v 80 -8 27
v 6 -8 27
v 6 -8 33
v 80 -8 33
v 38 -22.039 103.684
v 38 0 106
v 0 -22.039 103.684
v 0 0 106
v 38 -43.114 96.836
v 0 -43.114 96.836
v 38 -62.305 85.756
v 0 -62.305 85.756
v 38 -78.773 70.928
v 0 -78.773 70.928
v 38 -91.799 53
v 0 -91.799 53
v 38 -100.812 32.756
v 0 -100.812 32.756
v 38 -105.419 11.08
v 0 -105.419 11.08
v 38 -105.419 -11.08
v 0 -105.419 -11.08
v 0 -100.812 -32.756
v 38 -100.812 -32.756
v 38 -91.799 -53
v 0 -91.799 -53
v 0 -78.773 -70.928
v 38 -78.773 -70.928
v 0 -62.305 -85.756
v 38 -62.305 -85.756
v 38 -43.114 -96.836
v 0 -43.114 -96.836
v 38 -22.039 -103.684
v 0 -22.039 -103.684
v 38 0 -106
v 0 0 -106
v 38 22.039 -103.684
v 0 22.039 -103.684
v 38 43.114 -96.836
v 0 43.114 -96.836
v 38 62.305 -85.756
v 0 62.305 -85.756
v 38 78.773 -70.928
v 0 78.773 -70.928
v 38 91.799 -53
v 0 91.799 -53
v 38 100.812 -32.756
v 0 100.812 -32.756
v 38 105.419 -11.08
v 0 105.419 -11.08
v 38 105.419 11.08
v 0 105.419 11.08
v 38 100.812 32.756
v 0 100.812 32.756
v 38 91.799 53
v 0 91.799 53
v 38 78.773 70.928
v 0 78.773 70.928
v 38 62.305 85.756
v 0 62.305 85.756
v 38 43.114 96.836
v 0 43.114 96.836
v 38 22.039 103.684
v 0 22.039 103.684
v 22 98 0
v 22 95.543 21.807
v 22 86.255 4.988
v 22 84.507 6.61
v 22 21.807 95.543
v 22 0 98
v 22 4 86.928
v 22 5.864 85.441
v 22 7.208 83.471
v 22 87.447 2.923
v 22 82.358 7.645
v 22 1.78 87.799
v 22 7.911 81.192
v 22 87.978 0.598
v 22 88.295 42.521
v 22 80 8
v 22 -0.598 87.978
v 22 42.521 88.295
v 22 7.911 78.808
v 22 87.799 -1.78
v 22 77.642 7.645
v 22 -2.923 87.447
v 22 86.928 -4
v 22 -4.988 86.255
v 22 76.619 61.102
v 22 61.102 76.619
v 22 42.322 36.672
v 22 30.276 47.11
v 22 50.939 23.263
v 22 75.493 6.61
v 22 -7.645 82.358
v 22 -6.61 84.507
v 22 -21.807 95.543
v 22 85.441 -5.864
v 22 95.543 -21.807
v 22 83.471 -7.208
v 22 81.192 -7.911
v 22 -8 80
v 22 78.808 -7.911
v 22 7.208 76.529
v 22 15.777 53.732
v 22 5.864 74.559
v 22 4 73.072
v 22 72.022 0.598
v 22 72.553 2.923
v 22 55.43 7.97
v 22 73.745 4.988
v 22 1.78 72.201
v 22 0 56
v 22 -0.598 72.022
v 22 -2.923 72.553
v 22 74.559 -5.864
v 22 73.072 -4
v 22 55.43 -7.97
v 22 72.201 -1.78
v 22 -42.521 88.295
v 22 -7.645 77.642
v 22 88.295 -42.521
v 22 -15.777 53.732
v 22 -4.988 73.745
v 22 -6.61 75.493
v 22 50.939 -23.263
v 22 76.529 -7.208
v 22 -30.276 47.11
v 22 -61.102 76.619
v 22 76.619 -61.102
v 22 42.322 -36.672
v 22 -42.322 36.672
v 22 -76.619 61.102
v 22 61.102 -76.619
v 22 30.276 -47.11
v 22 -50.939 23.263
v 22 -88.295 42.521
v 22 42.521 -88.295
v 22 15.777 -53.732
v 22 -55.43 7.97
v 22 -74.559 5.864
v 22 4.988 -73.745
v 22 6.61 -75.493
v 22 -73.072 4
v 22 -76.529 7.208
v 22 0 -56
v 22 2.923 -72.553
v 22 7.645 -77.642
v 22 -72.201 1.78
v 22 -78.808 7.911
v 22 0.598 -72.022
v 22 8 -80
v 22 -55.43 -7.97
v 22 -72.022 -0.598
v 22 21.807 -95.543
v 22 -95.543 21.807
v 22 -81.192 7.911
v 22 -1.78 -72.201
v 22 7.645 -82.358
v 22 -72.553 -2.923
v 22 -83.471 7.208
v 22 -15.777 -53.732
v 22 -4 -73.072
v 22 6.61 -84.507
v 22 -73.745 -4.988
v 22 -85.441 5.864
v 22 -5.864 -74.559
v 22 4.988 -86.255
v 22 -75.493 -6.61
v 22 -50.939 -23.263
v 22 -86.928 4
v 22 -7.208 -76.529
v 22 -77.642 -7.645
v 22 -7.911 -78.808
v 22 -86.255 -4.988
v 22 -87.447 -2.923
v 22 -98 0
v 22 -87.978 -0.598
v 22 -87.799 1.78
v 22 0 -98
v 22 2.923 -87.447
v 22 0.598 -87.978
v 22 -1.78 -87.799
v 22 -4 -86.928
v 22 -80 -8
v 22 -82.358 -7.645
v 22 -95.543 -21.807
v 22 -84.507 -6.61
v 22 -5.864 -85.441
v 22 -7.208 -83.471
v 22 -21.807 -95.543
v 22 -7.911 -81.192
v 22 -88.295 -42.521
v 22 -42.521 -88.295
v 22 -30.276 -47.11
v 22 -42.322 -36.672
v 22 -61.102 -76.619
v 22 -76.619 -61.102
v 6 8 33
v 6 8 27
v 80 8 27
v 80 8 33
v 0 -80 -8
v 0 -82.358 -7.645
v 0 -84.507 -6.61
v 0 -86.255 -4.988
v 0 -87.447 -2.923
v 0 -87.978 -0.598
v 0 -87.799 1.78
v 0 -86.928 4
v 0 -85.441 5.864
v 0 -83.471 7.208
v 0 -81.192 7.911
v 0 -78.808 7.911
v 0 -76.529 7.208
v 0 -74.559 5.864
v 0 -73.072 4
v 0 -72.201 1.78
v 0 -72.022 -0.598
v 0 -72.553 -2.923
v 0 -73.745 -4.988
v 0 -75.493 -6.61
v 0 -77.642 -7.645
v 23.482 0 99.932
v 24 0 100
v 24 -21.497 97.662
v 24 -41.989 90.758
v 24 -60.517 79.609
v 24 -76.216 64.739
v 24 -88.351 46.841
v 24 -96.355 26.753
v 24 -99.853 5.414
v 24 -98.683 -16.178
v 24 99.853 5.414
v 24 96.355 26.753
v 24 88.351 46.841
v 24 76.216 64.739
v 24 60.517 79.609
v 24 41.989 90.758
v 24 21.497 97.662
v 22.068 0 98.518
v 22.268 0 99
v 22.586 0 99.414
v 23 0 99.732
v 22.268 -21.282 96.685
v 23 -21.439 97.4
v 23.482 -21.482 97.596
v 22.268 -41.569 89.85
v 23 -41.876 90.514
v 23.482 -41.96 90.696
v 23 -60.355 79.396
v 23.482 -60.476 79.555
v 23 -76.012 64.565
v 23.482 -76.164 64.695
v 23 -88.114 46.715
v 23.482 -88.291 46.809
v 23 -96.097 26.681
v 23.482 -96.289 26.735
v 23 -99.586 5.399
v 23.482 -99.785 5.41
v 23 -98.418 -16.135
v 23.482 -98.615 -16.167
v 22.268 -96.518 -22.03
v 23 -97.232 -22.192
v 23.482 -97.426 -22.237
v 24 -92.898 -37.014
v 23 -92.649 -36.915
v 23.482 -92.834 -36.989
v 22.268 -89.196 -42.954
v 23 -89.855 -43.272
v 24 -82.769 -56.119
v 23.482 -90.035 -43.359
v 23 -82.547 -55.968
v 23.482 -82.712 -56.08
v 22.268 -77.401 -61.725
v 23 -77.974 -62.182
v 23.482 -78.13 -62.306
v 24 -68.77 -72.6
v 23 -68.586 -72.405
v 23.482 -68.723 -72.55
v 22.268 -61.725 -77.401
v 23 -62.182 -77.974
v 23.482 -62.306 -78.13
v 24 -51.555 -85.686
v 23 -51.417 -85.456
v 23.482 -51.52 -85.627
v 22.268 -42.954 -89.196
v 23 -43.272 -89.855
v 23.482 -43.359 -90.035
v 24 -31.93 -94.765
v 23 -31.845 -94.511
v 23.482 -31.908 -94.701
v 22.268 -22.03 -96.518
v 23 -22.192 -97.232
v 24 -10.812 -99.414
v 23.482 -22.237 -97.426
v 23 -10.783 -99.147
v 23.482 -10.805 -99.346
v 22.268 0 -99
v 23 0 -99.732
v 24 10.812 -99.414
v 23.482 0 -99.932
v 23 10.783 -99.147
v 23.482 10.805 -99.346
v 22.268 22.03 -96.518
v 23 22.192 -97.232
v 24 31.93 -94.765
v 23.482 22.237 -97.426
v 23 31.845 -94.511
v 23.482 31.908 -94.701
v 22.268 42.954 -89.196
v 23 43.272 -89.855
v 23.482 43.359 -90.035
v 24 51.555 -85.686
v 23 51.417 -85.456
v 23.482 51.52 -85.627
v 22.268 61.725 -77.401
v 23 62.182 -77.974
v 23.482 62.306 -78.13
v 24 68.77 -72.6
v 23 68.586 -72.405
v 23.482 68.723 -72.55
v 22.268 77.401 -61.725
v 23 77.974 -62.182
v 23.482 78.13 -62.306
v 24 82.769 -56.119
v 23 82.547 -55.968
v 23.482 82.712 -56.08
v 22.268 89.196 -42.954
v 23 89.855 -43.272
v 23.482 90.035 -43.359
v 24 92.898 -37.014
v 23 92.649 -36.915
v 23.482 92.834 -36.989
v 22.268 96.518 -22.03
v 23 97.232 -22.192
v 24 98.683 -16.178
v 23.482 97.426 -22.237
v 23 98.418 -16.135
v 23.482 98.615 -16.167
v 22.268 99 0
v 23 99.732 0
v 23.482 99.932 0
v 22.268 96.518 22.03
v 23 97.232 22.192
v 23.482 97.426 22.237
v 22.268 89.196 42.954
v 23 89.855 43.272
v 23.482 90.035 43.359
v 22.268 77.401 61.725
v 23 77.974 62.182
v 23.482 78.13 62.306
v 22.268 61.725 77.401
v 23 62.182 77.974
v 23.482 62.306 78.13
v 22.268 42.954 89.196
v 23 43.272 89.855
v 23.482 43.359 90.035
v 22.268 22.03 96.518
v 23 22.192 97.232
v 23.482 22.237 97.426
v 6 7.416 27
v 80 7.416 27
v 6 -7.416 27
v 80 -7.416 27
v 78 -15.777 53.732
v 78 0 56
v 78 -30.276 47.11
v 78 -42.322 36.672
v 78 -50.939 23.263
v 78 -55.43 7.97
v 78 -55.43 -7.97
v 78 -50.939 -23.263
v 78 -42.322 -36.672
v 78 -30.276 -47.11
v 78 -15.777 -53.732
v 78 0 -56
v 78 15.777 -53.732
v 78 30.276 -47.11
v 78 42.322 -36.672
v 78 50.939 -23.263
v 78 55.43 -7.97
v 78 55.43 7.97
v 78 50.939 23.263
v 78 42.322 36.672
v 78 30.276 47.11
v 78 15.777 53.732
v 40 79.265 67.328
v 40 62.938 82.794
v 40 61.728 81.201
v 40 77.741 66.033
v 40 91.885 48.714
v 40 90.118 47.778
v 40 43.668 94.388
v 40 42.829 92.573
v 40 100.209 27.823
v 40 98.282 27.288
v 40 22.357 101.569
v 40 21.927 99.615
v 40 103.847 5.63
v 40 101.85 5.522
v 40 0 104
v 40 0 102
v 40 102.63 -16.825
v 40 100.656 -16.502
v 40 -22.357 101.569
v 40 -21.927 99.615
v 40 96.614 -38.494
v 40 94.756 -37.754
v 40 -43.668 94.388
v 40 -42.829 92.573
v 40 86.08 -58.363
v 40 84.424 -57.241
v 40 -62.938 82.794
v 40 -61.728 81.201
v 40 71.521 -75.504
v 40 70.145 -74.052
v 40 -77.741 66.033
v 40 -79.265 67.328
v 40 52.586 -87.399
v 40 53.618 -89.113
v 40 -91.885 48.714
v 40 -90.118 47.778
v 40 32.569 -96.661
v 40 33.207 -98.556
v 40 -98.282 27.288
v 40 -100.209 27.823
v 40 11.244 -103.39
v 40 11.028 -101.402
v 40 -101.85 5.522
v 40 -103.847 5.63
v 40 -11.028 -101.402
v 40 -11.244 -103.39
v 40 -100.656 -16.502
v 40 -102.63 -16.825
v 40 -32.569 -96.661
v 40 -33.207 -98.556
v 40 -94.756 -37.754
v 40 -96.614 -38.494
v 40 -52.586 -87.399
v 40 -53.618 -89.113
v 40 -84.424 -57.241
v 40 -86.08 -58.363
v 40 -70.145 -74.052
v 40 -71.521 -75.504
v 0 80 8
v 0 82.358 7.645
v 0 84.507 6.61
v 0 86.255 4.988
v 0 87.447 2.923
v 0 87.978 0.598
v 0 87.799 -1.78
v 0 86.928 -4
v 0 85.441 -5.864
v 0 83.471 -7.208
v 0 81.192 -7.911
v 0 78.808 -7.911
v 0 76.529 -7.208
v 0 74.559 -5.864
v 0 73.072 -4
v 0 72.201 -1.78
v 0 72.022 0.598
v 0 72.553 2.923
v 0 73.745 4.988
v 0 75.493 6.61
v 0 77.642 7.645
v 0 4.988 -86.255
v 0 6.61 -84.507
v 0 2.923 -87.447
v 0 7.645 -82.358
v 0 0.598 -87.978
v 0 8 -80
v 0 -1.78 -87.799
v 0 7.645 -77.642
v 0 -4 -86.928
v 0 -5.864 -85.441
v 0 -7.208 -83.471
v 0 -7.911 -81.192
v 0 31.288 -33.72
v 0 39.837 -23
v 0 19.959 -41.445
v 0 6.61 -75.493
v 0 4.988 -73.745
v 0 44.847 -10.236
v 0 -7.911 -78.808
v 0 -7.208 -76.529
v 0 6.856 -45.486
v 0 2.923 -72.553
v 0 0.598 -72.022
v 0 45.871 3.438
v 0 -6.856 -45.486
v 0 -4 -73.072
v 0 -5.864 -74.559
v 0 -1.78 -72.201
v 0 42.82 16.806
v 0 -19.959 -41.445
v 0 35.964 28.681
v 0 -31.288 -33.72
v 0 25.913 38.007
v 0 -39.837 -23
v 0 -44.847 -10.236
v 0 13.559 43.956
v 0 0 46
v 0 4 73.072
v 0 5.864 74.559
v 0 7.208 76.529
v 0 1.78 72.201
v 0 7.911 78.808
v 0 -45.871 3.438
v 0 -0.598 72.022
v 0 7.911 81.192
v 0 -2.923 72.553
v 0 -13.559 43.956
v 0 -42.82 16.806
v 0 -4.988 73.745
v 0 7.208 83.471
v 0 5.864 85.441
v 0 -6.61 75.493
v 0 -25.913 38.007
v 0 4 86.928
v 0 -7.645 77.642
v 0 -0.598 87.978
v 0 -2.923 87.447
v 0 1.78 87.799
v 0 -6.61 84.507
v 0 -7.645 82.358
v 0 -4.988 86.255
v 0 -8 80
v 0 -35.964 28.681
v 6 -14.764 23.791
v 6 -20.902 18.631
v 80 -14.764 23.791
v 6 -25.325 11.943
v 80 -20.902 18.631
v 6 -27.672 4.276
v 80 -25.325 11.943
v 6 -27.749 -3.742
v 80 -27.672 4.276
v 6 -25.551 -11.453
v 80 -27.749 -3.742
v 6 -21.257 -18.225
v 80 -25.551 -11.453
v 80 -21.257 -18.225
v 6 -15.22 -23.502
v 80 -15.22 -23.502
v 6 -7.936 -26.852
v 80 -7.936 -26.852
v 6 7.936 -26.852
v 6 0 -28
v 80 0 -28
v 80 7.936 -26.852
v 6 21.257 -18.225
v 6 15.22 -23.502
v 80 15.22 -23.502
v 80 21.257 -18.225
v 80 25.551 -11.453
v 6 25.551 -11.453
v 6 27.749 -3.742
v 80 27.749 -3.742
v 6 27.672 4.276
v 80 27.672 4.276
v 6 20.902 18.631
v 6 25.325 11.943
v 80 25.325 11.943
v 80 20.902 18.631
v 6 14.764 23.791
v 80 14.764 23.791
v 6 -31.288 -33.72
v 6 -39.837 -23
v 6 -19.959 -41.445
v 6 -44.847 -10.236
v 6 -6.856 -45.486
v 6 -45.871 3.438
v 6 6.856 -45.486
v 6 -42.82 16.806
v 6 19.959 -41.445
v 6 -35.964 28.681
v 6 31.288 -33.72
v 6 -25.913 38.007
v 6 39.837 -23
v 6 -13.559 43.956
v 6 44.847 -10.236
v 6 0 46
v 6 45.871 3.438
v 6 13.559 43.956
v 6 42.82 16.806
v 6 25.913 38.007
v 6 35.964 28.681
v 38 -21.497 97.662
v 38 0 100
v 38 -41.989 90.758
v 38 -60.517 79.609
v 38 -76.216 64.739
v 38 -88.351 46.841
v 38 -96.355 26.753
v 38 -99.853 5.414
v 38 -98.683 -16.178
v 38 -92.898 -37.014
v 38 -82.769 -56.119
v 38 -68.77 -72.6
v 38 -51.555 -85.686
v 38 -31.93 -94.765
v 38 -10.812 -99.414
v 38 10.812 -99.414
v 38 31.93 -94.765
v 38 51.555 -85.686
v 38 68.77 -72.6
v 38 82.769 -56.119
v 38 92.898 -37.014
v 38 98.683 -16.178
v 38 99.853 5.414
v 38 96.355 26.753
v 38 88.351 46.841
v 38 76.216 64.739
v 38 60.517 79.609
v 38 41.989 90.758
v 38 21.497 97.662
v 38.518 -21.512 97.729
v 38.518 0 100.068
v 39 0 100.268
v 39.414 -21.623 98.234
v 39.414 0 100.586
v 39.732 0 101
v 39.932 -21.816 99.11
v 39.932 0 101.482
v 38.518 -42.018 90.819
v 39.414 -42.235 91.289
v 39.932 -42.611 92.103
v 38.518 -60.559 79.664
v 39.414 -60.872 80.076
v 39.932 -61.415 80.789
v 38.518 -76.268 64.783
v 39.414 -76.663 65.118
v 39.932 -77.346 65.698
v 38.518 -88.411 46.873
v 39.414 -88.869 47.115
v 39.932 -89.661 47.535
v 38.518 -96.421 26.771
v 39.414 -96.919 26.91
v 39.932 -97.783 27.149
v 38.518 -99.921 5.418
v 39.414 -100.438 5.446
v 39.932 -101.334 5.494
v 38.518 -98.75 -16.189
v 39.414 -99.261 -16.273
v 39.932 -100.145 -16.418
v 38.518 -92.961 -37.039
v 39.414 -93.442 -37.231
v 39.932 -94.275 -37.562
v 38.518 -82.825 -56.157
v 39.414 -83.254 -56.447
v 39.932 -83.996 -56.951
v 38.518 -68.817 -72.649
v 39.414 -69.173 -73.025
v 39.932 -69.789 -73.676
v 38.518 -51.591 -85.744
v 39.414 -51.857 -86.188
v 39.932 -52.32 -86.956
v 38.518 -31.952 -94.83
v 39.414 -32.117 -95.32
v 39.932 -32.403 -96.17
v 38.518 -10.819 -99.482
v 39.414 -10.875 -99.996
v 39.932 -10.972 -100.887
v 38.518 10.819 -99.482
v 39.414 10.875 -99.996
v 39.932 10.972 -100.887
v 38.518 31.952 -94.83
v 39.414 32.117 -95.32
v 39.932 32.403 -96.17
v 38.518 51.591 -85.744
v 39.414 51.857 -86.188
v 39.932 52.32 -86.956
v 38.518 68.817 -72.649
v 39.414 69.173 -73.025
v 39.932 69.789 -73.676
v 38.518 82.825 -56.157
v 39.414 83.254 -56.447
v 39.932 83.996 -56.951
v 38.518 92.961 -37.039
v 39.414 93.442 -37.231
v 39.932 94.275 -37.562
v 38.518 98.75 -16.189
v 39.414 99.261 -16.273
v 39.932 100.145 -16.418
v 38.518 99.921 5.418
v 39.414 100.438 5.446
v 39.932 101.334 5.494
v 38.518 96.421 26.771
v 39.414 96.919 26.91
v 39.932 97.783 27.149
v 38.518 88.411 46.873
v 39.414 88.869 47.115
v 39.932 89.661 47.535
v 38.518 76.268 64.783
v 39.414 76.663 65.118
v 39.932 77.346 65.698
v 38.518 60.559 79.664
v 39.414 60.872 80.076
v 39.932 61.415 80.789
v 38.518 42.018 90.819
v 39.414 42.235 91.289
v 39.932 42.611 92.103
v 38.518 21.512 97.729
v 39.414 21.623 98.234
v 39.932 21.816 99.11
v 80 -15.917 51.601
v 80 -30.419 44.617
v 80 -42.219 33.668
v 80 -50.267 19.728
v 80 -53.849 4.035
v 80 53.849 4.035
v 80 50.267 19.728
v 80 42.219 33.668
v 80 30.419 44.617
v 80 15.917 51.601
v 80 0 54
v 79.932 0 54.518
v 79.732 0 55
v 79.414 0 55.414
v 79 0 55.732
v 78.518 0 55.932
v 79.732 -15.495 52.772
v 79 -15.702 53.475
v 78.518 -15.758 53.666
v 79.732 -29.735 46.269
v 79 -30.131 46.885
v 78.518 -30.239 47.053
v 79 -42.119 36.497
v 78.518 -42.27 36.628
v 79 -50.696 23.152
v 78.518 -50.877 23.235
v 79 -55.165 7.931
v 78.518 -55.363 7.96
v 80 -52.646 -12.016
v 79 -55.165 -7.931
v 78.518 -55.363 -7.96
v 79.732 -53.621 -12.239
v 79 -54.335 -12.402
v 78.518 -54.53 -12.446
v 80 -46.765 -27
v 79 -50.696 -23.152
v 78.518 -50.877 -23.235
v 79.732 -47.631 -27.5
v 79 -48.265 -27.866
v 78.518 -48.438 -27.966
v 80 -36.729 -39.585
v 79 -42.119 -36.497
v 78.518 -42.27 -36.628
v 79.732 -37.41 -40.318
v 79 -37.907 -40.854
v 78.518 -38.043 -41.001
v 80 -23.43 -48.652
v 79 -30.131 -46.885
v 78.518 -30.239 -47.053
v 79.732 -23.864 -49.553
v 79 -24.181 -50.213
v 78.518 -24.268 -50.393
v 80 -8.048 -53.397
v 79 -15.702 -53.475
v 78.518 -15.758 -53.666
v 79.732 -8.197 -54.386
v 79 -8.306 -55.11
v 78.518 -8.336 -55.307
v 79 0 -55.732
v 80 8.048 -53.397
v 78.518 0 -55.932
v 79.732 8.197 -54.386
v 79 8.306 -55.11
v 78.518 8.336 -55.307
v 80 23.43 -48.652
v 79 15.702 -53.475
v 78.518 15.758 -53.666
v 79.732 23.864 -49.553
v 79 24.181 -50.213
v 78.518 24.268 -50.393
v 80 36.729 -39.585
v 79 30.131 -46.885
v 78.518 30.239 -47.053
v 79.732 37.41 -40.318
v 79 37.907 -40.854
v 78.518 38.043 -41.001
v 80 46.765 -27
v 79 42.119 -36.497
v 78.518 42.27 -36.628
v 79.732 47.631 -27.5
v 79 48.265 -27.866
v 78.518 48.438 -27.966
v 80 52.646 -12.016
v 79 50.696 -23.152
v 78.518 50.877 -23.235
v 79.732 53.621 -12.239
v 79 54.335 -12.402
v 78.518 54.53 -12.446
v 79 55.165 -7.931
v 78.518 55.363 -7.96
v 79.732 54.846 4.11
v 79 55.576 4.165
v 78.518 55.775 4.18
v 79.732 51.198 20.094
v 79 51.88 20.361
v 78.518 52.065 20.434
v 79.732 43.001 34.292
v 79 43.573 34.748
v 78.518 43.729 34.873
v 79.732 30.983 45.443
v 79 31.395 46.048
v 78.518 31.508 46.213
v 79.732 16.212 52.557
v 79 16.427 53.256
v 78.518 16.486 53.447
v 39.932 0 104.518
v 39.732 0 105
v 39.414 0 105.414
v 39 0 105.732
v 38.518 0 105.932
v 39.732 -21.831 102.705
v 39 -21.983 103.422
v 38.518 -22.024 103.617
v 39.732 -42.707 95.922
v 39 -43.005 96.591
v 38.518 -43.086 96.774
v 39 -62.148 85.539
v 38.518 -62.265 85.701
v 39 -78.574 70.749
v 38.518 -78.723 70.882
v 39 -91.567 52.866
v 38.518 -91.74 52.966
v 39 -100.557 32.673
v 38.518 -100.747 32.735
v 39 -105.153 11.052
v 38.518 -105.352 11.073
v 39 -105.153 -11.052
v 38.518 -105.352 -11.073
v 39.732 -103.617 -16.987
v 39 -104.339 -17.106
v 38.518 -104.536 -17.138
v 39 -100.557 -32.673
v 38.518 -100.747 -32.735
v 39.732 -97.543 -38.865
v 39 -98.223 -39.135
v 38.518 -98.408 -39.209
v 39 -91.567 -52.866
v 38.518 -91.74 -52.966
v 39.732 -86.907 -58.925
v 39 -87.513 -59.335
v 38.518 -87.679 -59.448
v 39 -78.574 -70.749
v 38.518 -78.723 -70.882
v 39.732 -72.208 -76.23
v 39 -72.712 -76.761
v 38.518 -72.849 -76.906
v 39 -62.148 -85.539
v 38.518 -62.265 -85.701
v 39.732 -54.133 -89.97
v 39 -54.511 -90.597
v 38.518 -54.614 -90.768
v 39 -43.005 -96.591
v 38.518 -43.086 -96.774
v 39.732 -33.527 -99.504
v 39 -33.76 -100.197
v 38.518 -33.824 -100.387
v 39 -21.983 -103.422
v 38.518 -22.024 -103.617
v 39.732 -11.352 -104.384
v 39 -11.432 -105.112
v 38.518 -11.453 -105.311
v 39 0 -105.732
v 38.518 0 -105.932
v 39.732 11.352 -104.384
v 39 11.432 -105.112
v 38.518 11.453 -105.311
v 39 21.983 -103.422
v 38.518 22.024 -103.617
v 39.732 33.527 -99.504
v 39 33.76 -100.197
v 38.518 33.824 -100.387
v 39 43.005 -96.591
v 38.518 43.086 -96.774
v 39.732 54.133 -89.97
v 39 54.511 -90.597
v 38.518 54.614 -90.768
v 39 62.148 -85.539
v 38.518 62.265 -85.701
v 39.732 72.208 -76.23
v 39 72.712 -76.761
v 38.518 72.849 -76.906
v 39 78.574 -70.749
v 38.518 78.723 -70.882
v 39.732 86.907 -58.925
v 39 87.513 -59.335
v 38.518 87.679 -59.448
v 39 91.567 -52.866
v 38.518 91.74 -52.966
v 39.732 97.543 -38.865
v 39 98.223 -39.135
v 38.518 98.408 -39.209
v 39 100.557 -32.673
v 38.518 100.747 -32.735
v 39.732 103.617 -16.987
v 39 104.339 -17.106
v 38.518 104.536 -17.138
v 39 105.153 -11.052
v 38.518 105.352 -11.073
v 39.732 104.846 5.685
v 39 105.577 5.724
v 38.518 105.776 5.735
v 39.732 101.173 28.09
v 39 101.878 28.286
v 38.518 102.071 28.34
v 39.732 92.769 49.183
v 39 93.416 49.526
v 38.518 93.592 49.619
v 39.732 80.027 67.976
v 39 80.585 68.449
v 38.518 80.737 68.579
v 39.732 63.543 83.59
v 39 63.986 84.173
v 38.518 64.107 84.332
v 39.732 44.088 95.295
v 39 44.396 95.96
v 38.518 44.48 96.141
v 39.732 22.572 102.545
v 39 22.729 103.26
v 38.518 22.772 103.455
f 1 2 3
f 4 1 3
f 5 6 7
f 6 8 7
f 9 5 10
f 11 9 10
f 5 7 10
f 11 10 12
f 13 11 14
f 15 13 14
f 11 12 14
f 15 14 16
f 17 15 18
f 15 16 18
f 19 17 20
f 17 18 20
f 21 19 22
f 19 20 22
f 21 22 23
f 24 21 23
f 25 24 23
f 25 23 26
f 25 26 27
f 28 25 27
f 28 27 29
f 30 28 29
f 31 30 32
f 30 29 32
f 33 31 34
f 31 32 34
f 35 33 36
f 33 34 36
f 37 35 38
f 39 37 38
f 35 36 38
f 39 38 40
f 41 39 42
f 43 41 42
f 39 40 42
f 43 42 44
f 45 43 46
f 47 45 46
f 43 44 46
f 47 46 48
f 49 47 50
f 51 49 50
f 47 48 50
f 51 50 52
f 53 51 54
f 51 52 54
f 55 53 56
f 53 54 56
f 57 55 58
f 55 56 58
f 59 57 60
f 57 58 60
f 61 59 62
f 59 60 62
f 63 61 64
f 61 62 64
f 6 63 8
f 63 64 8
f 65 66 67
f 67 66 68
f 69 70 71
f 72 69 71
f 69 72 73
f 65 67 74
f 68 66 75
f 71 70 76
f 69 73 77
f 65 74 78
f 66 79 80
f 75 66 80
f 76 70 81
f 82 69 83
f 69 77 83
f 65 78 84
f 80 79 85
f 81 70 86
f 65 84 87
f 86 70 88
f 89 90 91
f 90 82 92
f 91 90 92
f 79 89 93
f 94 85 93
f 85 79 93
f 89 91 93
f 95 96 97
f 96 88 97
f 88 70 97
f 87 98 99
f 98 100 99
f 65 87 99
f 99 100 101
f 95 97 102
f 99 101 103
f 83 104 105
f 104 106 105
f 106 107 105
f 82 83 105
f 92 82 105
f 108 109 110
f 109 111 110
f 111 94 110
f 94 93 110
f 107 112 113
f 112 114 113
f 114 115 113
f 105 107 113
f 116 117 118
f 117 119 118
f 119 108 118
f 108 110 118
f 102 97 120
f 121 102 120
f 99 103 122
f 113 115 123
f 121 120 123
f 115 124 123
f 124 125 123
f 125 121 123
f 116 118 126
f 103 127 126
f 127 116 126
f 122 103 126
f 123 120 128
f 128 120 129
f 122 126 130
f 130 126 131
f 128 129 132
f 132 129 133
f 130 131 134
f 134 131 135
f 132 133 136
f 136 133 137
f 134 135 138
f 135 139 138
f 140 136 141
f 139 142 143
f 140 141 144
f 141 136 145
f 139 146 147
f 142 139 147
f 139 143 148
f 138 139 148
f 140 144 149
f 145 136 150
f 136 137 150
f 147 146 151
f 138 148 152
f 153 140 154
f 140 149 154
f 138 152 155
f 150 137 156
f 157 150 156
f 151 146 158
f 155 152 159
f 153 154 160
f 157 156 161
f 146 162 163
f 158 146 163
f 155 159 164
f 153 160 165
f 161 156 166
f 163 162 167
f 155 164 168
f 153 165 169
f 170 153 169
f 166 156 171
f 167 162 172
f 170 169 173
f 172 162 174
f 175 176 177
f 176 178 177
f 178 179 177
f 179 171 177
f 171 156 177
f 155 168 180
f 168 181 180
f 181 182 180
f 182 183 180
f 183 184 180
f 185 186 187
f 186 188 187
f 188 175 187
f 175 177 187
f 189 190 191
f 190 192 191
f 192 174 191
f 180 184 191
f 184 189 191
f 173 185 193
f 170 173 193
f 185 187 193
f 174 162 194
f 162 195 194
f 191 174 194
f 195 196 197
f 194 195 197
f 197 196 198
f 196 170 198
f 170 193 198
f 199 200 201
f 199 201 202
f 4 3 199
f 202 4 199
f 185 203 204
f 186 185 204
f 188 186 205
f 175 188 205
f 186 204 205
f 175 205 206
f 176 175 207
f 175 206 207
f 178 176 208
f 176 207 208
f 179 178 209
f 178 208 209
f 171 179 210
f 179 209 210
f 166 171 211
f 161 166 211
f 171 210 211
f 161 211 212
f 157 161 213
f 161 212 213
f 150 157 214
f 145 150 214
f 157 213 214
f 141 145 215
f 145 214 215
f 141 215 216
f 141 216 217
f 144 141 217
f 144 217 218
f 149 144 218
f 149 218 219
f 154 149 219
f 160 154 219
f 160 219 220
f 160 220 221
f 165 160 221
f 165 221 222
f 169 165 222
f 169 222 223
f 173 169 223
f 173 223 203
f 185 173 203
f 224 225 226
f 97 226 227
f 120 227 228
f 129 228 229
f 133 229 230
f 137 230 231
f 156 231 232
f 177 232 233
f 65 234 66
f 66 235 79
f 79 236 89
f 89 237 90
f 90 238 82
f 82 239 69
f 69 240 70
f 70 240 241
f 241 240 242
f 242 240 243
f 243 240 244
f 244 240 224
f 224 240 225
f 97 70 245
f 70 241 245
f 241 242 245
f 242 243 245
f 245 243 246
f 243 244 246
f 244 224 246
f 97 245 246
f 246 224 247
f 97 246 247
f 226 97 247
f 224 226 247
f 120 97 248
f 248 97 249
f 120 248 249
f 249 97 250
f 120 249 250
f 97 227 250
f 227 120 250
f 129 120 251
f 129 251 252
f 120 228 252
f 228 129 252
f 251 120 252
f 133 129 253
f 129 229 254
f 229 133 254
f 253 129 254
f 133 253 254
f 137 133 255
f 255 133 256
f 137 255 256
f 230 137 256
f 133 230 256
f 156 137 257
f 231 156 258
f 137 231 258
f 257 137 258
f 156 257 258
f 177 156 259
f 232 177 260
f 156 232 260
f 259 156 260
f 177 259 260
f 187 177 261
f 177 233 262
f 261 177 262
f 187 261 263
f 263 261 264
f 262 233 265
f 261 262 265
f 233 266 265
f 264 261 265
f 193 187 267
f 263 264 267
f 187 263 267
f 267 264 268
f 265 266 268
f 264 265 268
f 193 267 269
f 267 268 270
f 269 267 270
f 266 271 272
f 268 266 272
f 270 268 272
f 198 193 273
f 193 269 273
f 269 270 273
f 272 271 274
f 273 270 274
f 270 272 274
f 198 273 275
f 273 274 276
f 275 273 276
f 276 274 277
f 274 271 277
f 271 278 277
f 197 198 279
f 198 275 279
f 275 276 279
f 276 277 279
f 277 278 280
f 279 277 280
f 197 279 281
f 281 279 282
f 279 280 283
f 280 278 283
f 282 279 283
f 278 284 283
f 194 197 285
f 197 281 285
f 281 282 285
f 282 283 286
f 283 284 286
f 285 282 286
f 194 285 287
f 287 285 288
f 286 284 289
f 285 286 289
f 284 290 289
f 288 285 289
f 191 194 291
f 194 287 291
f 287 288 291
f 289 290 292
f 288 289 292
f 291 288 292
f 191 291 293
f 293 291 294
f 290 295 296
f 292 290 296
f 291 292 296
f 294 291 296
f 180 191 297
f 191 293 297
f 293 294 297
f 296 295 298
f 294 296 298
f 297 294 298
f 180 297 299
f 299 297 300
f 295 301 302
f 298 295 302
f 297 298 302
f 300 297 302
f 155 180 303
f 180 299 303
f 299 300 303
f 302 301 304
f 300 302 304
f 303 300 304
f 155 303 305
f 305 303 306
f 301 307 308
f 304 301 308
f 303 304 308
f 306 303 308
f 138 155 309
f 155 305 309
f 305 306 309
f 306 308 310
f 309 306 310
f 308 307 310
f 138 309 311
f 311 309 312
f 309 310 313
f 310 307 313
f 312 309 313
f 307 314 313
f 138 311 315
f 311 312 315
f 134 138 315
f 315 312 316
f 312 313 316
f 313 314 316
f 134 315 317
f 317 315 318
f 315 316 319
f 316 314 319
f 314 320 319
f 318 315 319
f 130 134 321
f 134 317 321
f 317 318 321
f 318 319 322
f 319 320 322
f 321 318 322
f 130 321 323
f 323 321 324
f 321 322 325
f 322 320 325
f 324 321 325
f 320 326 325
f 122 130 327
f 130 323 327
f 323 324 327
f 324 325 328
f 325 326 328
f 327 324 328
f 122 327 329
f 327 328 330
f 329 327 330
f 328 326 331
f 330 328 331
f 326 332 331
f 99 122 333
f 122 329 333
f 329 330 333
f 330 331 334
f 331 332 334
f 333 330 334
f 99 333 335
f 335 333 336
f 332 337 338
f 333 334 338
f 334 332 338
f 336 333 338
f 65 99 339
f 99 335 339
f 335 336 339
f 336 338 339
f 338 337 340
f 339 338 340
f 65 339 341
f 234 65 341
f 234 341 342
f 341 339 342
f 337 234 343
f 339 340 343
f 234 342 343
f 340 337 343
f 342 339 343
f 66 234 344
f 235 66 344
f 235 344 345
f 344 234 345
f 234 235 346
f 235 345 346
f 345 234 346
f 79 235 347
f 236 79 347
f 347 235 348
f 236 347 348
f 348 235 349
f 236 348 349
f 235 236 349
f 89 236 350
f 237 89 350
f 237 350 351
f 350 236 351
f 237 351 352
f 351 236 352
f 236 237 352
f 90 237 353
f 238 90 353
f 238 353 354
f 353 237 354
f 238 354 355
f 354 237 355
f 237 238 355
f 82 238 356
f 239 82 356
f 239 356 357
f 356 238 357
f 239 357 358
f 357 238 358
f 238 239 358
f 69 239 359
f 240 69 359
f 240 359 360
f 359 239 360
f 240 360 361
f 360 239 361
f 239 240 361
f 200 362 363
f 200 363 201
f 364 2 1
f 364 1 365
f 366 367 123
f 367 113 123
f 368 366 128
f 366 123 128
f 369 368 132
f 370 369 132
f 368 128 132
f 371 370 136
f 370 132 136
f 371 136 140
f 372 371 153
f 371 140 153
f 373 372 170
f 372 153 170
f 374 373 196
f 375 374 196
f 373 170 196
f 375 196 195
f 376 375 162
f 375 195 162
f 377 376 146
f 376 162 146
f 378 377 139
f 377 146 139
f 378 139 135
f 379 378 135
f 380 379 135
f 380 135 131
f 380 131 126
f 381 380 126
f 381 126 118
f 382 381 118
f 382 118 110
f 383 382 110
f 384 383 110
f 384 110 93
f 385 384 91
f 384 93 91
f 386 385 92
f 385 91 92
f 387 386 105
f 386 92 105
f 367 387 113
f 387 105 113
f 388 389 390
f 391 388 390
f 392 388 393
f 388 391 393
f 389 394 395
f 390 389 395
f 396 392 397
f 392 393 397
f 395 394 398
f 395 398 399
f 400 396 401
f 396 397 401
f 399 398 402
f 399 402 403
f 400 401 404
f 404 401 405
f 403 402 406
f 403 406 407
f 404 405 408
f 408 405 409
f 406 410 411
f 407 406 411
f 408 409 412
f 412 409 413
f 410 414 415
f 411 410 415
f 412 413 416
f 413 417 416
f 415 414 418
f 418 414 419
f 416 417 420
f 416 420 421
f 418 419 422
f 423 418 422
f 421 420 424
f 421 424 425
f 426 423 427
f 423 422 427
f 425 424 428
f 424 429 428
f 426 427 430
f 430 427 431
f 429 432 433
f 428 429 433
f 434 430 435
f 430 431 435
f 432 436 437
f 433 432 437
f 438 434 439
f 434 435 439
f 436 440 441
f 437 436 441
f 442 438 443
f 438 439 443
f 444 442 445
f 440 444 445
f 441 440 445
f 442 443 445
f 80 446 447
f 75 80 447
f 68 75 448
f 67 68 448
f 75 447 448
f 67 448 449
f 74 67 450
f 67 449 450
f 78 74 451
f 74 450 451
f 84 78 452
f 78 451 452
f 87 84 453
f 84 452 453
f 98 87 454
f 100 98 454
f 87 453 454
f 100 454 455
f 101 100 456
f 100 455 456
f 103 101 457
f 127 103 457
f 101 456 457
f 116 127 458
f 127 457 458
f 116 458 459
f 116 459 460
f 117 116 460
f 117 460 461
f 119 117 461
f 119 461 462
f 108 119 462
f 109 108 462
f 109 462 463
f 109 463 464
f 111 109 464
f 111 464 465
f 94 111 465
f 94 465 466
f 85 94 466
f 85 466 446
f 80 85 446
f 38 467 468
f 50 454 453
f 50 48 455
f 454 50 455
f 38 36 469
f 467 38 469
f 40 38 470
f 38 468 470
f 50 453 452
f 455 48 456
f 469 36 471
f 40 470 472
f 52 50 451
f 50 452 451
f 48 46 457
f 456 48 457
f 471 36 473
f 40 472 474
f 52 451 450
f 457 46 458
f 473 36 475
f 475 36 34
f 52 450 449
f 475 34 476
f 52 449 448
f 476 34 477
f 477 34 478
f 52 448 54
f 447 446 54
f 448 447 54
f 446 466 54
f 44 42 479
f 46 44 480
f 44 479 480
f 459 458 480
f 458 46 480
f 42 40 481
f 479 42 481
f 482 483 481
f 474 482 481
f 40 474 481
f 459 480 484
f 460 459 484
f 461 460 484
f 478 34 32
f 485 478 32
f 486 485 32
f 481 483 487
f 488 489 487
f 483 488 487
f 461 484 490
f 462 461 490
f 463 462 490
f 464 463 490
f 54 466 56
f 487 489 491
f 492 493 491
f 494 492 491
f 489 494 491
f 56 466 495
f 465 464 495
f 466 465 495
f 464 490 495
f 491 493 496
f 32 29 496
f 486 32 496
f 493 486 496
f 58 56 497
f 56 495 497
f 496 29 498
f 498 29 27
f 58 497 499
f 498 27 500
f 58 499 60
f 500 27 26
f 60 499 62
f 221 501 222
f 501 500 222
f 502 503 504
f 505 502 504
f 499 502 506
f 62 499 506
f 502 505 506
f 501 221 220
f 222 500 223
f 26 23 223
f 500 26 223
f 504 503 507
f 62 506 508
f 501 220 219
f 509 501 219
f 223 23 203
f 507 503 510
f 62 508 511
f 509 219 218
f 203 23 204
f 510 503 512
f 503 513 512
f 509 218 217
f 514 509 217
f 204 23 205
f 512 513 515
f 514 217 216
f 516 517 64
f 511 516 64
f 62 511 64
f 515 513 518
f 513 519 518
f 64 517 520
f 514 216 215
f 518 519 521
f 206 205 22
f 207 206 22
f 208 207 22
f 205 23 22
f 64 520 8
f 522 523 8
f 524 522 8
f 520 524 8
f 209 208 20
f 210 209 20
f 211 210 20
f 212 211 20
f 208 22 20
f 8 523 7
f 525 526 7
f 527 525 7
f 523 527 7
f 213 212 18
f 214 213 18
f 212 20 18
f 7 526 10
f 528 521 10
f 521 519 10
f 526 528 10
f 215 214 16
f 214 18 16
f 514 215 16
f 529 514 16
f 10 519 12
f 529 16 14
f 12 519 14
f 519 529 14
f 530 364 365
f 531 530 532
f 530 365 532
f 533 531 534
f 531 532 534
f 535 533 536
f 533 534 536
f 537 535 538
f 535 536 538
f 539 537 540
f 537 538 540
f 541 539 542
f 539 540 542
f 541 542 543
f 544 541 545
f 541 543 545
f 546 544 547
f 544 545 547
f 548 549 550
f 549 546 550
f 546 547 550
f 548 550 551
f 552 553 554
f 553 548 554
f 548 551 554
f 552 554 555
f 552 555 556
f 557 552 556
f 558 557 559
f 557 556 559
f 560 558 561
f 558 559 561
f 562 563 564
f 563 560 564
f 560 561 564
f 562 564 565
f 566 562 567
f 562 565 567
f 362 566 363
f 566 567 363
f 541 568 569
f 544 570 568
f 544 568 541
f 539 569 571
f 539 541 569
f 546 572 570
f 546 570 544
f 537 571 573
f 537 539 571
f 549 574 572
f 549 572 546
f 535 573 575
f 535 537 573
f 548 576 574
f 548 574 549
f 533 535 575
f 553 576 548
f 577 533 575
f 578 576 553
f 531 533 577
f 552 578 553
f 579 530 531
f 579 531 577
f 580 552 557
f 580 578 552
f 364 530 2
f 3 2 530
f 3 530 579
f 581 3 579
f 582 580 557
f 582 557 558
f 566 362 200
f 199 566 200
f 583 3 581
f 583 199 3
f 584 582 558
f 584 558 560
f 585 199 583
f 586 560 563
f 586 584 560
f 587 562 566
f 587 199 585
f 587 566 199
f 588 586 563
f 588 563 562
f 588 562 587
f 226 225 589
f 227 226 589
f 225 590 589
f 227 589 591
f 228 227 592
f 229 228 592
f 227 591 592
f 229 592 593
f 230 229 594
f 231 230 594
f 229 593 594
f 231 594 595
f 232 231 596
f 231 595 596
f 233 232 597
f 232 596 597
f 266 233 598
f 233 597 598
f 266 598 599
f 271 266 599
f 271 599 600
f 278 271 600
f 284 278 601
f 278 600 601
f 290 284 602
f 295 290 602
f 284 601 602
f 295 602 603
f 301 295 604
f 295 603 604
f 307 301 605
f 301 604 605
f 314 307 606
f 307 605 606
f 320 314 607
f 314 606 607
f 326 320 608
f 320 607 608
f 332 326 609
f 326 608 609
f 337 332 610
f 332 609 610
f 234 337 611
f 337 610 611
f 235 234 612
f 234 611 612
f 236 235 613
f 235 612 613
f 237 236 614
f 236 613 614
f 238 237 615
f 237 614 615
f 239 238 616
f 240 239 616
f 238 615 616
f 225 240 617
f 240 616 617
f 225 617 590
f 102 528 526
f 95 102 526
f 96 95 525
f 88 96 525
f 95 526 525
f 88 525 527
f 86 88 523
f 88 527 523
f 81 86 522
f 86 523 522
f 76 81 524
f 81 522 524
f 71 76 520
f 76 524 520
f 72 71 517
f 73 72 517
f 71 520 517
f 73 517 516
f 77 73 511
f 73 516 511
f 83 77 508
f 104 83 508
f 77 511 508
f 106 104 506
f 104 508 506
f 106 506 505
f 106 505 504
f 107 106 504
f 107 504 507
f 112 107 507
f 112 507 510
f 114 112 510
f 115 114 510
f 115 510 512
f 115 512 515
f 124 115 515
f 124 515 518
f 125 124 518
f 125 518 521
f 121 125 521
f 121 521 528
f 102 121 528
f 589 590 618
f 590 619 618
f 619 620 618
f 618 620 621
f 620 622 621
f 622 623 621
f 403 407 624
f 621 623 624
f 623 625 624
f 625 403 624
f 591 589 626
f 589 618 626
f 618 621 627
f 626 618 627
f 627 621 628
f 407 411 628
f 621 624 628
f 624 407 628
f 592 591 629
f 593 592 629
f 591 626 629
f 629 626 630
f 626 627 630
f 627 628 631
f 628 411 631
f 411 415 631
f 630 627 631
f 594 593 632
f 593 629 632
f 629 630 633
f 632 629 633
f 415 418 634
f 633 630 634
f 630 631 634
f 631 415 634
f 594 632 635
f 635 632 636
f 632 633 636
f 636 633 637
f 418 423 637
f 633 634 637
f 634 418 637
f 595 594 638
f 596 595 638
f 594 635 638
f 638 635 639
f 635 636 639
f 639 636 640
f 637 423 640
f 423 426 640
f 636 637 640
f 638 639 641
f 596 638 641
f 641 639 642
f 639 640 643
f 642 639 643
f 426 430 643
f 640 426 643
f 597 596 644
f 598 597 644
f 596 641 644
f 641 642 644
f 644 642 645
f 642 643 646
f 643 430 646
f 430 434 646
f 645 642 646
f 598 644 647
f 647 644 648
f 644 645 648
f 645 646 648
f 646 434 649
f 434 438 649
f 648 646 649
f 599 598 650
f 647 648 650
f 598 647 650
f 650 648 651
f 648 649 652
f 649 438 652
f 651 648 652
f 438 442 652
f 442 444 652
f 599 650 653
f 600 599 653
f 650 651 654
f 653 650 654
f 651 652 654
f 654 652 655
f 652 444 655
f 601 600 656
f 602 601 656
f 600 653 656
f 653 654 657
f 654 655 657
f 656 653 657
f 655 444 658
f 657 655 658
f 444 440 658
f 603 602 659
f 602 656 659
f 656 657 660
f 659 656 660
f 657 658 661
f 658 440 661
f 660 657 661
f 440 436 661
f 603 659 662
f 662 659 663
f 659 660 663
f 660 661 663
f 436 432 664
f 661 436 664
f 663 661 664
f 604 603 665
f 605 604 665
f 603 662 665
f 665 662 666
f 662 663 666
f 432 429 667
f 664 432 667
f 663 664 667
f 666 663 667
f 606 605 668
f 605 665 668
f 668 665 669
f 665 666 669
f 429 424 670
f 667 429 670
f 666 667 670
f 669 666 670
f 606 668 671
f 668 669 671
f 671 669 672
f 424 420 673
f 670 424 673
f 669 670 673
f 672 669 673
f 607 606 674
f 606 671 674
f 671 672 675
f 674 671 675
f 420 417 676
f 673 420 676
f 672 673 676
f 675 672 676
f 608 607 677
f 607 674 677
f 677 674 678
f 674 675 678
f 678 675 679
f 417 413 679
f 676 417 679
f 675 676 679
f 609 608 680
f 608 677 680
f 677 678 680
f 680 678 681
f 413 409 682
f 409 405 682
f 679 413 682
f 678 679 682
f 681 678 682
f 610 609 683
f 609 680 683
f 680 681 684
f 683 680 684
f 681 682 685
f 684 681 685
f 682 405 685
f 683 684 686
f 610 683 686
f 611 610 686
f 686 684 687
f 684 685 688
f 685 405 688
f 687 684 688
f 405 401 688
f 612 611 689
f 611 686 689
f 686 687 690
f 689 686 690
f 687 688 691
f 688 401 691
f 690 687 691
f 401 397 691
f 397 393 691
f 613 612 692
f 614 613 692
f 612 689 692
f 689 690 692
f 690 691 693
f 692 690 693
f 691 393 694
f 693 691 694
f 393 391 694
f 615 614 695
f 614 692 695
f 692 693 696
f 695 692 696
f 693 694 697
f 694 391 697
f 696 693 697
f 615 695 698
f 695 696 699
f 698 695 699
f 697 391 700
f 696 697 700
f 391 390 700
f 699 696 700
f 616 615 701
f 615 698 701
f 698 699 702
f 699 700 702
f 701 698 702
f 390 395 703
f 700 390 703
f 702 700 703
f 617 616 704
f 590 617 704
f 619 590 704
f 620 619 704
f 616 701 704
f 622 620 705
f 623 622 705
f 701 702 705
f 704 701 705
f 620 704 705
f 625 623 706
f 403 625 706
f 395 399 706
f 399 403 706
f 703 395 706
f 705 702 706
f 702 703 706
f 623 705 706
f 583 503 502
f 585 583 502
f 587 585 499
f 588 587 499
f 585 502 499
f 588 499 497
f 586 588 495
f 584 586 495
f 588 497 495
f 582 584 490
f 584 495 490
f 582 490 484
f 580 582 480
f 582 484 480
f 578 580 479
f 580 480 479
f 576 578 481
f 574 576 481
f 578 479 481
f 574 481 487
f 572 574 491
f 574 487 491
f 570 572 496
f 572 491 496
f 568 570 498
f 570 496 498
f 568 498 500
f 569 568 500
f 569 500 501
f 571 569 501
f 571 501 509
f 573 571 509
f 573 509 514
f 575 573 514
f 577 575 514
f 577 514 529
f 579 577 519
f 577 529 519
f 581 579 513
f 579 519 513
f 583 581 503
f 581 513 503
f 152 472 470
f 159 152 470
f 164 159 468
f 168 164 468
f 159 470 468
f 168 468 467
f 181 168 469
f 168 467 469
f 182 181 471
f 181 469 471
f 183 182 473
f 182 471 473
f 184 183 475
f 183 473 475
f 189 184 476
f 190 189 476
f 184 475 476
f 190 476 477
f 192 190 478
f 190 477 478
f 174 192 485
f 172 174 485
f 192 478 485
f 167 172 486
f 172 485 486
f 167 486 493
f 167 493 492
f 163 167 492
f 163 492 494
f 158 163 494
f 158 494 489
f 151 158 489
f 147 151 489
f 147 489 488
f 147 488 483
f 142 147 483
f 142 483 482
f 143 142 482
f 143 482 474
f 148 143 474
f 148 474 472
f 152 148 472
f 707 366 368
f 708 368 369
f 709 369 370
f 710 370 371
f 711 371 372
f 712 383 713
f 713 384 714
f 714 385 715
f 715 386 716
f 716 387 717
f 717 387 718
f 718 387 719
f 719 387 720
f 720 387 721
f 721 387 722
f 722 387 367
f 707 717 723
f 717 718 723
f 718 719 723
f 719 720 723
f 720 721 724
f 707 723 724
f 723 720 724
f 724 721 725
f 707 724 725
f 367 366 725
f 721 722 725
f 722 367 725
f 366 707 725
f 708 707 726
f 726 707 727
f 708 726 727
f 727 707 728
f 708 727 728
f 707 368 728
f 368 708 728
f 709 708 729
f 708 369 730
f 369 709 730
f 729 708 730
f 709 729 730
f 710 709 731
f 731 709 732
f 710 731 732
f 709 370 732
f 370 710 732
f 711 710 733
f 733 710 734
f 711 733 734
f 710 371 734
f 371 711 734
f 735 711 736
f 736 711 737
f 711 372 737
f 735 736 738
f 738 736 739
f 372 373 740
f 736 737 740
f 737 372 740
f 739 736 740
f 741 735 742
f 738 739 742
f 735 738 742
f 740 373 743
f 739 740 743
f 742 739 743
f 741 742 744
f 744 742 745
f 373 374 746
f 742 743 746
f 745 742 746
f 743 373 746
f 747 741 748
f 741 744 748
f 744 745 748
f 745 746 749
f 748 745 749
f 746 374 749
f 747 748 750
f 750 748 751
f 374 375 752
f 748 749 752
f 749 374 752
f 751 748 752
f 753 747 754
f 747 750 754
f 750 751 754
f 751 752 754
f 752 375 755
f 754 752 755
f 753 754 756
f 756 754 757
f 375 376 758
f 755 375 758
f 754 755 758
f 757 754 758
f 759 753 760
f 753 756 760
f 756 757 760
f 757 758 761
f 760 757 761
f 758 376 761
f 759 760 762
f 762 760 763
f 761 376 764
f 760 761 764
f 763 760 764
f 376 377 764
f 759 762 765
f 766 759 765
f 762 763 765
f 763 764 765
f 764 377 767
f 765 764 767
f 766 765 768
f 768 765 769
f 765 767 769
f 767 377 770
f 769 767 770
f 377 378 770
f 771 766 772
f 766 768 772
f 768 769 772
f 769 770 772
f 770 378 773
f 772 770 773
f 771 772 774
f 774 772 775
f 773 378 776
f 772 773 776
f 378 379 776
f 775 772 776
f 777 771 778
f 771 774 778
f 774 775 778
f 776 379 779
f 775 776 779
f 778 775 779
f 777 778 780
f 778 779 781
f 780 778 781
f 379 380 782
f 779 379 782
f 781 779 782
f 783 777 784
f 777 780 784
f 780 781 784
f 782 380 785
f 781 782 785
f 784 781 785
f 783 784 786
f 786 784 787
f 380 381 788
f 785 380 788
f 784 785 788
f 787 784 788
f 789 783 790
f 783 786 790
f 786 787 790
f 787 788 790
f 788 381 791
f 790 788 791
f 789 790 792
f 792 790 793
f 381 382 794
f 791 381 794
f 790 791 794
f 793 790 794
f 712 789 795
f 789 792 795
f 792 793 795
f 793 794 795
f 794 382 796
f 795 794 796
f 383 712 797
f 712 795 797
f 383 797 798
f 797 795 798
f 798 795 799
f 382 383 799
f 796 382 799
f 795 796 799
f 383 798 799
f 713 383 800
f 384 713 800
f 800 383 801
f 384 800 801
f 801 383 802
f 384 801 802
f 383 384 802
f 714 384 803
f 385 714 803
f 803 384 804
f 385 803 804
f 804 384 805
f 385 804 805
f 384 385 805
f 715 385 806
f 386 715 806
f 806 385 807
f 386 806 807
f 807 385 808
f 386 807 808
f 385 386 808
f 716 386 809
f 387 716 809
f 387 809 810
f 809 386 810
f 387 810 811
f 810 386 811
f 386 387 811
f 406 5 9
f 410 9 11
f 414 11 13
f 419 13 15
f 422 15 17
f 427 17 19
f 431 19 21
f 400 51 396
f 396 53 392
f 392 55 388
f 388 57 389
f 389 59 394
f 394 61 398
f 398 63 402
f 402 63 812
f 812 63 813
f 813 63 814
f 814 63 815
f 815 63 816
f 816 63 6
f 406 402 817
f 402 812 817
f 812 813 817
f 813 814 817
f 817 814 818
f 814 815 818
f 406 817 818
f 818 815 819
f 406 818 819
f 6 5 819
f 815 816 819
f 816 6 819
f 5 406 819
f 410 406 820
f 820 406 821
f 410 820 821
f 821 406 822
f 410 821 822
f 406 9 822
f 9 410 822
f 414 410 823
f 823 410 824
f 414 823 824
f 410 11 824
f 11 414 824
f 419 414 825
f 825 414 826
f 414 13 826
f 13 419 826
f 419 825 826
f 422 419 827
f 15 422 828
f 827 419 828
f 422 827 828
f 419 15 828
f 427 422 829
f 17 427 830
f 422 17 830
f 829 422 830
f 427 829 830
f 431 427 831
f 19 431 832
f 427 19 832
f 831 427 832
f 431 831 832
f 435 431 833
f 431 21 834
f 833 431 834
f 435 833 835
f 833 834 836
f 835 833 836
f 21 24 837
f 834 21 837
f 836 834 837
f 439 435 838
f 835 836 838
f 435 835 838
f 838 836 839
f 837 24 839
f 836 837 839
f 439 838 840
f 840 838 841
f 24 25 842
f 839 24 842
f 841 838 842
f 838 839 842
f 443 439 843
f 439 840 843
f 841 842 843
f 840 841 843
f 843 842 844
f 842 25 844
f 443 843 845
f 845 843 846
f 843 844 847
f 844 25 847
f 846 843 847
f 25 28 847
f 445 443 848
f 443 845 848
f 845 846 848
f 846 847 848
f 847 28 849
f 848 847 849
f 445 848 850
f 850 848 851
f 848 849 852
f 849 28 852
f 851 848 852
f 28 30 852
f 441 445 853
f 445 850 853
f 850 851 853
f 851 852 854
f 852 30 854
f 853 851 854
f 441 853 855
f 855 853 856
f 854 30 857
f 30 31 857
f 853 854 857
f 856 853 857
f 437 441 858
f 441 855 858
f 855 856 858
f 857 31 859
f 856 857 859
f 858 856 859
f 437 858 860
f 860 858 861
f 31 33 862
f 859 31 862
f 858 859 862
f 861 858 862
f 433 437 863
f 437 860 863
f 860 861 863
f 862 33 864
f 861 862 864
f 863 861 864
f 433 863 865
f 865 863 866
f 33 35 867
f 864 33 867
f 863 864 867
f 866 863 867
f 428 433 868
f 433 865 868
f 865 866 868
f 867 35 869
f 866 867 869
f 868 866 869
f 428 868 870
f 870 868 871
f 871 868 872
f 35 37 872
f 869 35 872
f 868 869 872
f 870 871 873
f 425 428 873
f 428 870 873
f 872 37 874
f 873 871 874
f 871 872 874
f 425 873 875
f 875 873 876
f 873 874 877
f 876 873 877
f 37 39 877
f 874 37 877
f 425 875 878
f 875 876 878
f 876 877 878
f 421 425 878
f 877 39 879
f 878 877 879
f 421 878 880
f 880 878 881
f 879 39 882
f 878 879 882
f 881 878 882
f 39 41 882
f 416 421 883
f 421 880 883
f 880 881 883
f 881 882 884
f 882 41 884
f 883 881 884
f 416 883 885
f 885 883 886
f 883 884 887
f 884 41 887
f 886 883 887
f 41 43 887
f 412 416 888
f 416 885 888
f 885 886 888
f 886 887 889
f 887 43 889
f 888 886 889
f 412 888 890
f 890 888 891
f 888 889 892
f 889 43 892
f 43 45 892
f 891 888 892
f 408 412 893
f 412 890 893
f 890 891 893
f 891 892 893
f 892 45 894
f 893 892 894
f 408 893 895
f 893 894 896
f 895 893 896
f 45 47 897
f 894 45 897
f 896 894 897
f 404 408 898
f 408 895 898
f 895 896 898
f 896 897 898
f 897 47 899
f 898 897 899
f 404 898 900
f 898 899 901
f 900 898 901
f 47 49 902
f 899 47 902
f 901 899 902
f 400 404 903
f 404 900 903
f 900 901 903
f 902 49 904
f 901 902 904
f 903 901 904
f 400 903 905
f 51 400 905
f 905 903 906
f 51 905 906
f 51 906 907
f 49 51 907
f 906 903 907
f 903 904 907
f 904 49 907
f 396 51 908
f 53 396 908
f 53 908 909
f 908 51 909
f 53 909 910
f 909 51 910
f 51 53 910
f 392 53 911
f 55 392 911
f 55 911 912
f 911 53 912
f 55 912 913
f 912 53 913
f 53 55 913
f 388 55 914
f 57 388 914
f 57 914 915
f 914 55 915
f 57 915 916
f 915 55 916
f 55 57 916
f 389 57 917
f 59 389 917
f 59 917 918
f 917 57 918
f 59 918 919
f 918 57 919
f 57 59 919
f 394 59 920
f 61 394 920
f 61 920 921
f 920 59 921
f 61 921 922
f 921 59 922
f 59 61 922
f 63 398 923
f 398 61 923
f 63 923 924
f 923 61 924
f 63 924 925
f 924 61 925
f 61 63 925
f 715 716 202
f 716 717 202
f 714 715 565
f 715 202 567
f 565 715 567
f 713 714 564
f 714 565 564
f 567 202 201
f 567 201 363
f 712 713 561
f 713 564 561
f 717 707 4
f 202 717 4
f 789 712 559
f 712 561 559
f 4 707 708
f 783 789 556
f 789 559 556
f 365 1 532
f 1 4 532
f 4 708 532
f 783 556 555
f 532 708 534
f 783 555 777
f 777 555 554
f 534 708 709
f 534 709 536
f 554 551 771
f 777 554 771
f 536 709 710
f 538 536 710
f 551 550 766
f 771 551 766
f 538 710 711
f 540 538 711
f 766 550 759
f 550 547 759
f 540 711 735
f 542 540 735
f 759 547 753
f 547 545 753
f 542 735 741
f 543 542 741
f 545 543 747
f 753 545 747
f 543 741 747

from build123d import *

# Parameters (mm, degrees)
SKETCH2_R          = 28
CUT_EXTRUDE1_DEPTH = 170.917627102
SKETCH3_R          = 46
CUT_EXTRUDE2_DEPTH = 6
SKETCH4_W          = 6
SKETCH4_H          = 16
CUT_EXTRUDE6_DEPTH = 168.176553424
SKETCH5_R          = 8
CUT_EXTRUDE7_DEPTH = 170.917627149
CIRPATTERN1_COUNT  = 4


with BuildPart() as part:
    # Sketch1 → Revolve1 (revolve)
    with BuildSketch(Plane.XY, mode=Mode.PRIVATE) as revolve1_sk:
        with BuildLine():
            Line((0, 0), (80, 0))
            Line((80, 0), (80, 54))
            ThreePointArc((80, 54), (79.414213562, 55.414213562), (78, 56))
            Line((78, 56), (28.292682927, 56))
            Line((28.292682927, 56), (22, 56))
            Line((22, 56), (22, 98))
            ThreePointArc((22, 98), (22.585786438, 99.414213562), (24, 100))
            Line((24, 100), (38, 100))
            ThreePointArc((38, 100), (39.414213562, 100.585786438), (40, 102))
            Line((40, 102), (40, 104))
            ThreePointArc((40, 104), (39.414213562, 105.414213562), (38, 106))
            Line((38, 106), (0, 106))
            Line((0, 106), (0, 0))
        make_face()
    revolve(revolve1_sk.sketch.rotate(Axis((0, 0, 0), (1, 0, 0)), 90), axis=Axis((0, 0, 0), (1, 0, 0)))

    # Sketch2 → Cut-Extrude1 (cut, through all)
    with BuildSketch(Plane(origin=(80, 0, 0), x_dir=(0, 0, -1), z_dir=(1, 0, 0))):
        Circle(SKETCH2_R)
    extrude(amount=-CUT_EXTRUDE1_DEPTH, mode=Mode.SUBTRACT)

    # Sketch3 → Cut-Extrude2 (cut)
    with BuildSketch(Plane.ZY):
        Circle(SKETCH3_R)
    extrude(amount=-CUT_EXTRUDE2_DEPTH, mode=Mode.SUBTRACT)

    # Sketch4 → Cut-Extrude6 (cut, through all)
    with BuildSketch(Plane.ZY.offset(-6)):
        with Locations((30, 0)):
            Rectangle(SKETCH4_W, SKETCH4_H)
    extrude(amount=-CUT_EXTRUDE6_DEPTH, mode=Mode.SUBTRACT)

    # Sketch5 → Cut-Extrude7 (cut, through all)
    with BuildSketch(Plane.ZY):
        with Locations((0, 80)):
            Circle(SKETCH5_R)
    cut_extrude7 = extrude(amount=-CUT_EXTRUDE7_DEPTH, mode=Mode.SUBTRACT)

    # CirPattern1: Cut-Extrude7 ×4 about axis
    cirpattern1_axis = Axis((0, 0, 0), (1, 0, 0))
    for i in range(1, CIRPATTERN1_COUNT):
        add(cut_extrude7.rotate(cirpattern1_axis, i * 360 / CIRPATTERN1_COUNT), mode=Mode.SUBTRACT)


solid = part.part
